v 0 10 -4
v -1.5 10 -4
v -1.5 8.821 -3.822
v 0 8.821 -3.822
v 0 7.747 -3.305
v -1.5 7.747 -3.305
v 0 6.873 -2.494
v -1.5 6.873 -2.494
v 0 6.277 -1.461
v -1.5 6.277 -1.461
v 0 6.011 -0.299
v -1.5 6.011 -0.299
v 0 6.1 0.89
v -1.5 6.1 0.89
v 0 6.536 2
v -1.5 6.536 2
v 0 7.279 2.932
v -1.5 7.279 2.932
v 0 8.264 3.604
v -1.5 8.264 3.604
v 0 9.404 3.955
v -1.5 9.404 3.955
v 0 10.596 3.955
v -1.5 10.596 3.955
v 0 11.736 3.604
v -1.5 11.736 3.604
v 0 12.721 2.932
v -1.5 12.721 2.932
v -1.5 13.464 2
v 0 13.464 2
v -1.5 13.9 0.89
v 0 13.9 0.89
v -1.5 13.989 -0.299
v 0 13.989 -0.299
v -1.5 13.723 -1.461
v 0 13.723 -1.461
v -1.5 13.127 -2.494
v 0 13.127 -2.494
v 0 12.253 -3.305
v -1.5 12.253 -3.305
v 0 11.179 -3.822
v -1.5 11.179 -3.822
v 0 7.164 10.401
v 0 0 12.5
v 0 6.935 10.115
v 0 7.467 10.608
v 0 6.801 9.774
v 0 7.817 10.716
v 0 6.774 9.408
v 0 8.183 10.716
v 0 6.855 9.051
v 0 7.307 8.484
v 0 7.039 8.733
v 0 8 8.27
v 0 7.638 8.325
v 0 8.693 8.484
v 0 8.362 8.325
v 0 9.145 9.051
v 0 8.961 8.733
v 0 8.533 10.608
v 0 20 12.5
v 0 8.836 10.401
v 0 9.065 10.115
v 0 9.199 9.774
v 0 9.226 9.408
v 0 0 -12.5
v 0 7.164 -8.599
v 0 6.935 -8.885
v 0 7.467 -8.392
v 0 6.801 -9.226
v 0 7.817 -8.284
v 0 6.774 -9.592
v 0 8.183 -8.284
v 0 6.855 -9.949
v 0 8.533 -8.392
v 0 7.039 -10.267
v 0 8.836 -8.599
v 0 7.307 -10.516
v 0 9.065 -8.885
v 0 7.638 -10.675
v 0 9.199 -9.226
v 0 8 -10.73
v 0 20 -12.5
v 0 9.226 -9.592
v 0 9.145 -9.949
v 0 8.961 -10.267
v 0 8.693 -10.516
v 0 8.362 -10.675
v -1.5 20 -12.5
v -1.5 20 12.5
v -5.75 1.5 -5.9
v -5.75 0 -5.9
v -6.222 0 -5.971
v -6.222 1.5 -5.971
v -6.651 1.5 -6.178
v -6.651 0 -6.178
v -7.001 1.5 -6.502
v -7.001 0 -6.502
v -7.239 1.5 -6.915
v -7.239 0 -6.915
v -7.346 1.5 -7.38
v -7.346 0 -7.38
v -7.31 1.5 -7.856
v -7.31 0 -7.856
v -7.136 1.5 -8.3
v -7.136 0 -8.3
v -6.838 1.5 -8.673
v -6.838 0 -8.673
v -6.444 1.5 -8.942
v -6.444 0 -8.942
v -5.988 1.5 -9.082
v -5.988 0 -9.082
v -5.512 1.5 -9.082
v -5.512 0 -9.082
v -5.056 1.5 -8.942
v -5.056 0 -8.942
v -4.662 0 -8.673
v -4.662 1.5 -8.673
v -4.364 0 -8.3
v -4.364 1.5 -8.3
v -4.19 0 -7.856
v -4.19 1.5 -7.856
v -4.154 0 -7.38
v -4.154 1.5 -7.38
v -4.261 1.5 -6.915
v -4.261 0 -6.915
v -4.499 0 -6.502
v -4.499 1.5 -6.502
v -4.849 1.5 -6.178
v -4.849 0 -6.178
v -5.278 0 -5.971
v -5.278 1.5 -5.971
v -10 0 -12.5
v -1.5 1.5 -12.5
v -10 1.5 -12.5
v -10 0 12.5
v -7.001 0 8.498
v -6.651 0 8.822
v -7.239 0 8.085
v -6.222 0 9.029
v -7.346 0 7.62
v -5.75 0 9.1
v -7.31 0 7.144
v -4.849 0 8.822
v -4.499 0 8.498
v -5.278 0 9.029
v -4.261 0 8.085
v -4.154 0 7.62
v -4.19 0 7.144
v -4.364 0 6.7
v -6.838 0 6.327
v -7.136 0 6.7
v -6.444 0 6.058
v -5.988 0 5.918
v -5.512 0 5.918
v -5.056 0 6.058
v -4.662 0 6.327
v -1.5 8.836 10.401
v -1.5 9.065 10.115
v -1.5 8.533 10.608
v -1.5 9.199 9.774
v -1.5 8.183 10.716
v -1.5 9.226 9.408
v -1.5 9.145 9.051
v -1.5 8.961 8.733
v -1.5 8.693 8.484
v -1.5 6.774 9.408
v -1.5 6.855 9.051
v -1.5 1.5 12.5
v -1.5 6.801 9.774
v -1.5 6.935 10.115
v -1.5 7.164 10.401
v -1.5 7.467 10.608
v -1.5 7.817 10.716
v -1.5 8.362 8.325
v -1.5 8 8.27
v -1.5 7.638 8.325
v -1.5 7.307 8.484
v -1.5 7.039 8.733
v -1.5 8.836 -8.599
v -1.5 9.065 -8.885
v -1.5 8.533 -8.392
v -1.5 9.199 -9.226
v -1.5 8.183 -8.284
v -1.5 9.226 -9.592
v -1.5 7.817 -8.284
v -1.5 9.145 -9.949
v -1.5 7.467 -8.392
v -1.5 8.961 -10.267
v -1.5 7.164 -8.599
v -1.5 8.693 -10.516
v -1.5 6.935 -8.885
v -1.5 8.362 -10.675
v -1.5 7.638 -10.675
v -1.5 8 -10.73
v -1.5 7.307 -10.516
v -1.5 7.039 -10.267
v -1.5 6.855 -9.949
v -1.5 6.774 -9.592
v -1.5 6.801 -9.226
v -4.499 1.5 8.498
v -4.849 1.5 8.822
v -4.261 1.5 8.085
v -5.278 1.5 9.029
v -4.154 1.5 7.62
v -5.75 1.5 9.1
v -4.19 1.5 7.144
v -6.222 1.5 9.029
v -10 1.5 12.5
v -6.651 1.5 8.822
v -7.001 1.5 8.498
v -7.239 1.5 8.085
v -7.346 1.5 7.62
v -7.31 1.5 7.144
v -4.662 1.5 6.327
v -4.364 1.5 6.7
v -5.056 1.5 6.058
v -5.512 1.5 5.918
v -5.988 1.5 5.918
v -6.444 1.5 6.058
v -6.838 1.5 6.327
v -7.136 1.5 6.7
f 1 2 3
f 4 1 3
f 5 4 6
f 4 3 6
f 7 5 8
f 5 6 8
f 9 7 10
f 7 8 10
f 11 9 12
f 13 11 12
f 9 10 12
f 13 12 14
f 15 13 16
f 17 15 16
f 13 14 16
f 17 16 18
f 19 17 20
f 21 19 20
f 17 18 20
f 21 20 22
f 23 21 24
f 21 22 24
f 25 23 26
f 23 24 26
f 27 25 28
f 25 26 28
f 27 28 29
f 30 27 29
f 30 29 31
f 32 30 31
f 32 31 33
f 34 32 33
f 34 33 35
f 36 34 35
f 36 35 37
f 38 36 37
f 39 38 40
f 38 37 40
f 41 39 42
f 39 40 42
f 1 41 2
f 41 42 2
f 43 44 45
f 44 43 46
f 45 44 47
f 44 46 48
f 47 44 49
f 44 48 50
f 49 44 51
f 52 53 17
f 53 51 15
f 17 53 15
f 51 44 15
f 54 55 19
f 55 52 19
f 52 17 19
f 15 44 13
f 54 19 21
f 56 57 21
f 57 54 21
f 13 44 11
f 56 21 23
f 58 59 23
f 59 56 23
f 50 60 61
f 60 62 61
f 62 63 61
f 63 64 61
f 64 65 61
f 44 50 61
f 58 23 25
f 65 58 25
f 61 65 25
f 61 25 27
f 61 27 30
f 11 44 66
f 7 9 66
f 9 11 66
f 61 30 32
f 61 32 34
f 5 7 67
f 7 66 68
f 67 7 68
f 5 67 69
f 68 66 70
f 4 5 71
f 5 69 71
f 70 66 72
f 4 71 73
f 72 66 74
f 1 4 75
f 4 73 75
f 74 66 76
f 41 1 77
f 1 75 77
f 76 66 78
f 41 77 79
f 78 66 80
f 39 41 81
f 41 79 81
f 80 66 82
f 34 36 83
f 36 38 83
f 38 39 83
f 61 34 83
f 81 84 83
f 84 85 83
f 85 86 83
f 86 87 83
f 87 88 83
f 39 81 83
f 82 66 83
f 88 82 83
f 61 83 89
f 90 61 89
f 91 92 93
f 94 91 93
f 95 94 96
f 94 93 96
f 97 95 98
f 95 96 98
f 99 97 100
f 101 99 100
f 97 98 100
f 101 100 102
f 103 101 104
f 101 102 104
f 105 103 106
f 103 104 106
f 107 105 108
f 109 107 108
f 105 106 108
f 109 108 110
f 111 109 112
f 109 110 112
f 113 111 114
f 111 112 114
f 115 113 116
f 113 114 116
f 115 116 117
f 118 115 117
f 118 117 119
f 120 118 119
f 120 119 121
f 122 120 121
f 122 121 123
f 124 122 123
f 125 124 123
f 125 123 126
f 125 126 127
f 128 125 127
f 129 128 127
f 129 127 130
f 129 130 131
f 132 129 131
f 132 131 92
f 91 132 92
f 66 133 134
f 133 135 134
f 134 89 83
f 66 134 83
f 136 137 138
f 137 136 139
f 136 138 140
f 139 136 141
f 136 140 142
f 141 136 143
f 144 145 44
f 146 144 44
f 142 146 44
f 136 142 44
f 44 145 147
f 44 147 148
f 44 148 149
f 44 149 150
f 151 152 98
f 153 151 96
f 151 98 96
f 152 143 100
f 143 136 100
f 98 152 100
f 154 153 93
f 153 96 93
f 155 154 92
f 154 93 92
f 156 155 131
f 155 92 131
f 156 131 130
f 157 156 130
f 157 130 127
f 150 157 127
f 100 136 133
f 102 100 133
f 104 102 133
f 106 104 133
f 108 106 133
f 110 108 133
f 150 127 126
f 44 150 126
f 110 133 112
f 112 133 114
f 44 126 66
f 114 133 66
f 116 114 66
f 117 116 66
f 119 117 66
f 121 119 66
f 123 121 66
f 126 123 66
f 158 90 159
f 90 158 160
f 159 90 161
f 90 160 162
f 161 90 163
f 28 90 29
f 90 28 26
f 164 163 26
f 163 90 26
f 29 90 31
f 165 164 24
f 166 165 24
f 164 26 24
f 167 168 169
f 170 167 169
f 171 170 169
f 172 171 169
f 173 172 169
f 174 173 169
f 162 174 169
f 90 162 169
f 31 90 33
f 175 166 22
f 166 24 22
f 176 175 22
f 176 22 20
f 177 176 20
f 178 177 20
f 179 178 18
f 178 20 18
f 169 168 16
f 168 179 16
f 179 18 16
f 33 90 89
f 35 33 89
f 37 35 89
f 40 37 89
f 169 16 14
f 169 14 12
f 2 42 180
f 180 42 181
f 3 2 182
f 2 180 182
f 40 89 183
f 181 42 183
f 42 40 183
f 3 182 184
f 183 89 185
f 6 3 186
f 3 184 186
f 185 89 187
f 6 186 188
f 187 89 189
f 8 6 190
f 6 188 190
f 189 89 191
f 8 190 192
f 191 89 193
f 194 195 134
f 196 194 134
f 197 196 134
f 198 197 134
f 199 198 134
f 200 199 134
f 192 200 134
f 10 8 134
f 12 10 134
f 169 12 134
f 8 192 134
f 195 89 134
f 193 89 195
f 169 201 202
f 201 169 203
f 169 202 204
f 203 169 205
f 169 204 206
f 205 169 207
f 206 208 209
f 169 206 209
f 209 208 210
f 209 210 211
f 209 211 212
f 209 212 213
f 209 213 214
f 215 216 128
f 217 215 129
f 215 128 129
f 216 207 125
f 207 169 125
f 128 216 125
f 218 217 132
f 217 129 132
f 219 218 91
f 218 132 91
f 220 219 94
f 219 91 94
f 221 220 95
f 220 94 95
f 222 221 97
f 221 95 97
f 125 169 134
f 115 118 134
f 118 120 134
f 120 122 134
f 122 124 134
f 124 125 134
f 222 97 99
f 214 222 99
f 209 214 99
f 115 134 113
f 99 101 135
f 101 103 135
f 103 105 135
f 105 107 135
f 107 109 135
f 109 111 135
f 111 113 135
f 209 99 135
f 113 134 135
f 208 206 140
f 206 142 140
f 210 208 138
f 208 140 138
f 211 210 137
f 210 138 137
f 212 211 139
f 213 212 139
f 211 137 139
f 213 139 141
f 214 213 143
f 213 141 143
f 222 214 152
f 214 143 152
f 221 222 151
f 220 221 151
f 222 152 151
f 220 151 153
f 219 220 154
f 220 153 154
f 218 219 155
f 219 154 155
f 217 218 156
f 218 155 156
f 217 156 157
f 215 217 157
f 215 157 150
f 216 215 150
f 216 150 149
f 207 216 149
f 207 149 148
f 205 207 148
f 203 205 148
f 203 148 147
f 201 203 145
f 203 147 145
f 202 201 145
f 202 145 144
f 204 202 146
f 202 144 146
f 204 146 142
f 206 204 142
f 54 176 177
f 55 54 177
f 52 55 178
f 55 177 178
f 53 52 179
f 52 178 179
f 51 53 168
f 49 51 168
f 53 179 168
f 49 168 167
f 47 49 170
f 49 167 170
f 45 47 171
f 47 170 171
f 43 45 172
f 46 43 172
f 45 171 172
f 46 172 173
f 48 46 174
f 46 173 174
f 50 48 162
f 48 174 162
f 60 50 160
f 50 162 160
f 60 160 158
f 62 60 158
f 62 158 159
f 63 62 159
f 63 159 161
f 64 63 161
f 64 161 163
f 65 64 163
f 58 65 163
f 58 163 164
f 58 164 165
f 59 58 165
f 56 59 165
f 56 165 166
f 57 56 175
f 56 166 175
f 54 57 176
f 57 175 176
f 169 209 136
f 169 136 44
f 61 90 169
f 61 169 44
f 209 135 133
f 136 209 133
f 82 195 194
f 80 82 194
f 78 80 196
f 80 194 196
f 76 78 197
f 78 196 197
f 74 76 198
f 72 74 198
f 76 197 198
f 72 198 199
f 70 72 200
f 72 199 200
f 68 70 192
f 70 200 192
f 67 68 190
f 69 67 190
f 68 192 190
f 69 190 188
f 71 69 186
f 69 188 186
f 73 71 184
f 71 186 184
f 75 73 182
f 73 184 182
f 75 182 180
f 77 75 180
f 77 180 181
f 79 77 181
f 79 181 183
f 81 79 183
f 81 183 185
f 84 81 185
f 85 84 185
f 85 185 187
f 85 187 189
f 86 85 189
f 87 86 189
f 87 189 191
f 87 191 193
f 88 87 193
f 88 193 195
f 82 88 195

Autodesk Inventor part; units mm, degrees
ref_plane "YZ Plane" through (0, 0, 0) normal (1, 0, 0) x (0, 1, 0)
ref_plane "XZ Plane" through (0, 0, 0) normal (0, 1, 0) x (-1, 0, 0)
ref_plane "XY Plane" through (0, 0, 0) normal (0, 0, 1) x (1, 0, 0)
sketch "Náčrt1" plane through (0, 0, 0) normal (0, 0, 1) x (1, 0, 0)
  line L0 (-10, 0) -> (0, 0)
  line L1 (0, 0) -> (0, 20)
  line L2 (0, 20) -> (-1.5, 20)
  line L3 (-1.5, 20) -> (-1.5, 1.5)
  line L4 (-1.5, 1.5) -> (-10, 1.5)
  line L5 (-10, 1.5) -> (-10, 0)
  line L6 (-12, 0) -> (2, 0) projected
  line L7 (0, 24) -> (0, -4) projected
  point P0 (0, 0)
  dimension "d0" = 20
  dimension "d1" = 10
  dimension "d2" = 1.5
  dimension "d3" = 1.5
extrude "Vysunutí1" add sketch "Náčrt1" along normal mid plane 25
sketch "Náčrt2" plane through (-10, 1.5, 12.5) normal (0, 1, 0) x (1, 0, 0)
  line L0 (0, 0) -> (0, 25) projected
  line L1 (8.5, 0) -> (0, 0) projected
  line L2 (8.5, 25) -> (8.5, 0) projected
  line L3 (0, 25) -> (8.5, 25) projected
  point P0 (10, 12.5)
  point P1 (4.25, 20)
  point P2 (4.25, 5)
  point P3 (4.25, 0)
  dimension "d6" = 4.25
  dimension "d7" = 4.25
  dimension "d56" = 15
  dimension "d57" = 5
hole "Díra1" at (-5.75, 1.5, -7.5) at (-5.75, 1.5, 7.5) direction (0, -1, 0) diameter 3.2 end through all
sketch "Náčrt7" plane through (0, 0, 12.5) normal (1, 0, 0) x (0, 0, -1)
  line L0 (25, 20) -> (0, 20) projected
  line L1 (0, 0) -> (0, 20) projected
  line L2 (25, 0) -> (0, 0) projected
  line L3 (25, 20) -> (25, 0) projected
  point P0 (12.5, 0)
  point P1 (12.5, 10)
  dimension "d58" = 12.5
  dimension "d59" = 10
hole "Díra5" at (0, 10, 0) direction (-1, 0, 0) diameter 8 end through all
sketch "Náčrt8" plane through (0, 0, 12.5) normal (1, 0, 0) x (0, 0, -1)
  circle A0 centre (12.5, 10) radius 4 projected
  line L0 (25, 20) -> (0, 20) projected
  line L1 (0, 0) -> (0, 20) projected
  line L2 (25, 0) -> (0, 0) projected
  line L3 (25, 20) -> (25, 0) projected
  point P0 (12.5, 0)
  point P1 (22, 8)
  point P2 (3, 8)
  dimension "d67" = 8
  dimension "d68" = 8
  dimension "d69" = 3
  dimension "d70" = 3
hole "Díra6" at (0, 8, -9.5) at (0, 8, 9.5) direction (-1, 0, 0) diameter 2.459 end through all thread size "M3x0.5" class "6H" standard "ISO Metric profile"
properties part number "bearing_holder" material "Hliník 6061"
